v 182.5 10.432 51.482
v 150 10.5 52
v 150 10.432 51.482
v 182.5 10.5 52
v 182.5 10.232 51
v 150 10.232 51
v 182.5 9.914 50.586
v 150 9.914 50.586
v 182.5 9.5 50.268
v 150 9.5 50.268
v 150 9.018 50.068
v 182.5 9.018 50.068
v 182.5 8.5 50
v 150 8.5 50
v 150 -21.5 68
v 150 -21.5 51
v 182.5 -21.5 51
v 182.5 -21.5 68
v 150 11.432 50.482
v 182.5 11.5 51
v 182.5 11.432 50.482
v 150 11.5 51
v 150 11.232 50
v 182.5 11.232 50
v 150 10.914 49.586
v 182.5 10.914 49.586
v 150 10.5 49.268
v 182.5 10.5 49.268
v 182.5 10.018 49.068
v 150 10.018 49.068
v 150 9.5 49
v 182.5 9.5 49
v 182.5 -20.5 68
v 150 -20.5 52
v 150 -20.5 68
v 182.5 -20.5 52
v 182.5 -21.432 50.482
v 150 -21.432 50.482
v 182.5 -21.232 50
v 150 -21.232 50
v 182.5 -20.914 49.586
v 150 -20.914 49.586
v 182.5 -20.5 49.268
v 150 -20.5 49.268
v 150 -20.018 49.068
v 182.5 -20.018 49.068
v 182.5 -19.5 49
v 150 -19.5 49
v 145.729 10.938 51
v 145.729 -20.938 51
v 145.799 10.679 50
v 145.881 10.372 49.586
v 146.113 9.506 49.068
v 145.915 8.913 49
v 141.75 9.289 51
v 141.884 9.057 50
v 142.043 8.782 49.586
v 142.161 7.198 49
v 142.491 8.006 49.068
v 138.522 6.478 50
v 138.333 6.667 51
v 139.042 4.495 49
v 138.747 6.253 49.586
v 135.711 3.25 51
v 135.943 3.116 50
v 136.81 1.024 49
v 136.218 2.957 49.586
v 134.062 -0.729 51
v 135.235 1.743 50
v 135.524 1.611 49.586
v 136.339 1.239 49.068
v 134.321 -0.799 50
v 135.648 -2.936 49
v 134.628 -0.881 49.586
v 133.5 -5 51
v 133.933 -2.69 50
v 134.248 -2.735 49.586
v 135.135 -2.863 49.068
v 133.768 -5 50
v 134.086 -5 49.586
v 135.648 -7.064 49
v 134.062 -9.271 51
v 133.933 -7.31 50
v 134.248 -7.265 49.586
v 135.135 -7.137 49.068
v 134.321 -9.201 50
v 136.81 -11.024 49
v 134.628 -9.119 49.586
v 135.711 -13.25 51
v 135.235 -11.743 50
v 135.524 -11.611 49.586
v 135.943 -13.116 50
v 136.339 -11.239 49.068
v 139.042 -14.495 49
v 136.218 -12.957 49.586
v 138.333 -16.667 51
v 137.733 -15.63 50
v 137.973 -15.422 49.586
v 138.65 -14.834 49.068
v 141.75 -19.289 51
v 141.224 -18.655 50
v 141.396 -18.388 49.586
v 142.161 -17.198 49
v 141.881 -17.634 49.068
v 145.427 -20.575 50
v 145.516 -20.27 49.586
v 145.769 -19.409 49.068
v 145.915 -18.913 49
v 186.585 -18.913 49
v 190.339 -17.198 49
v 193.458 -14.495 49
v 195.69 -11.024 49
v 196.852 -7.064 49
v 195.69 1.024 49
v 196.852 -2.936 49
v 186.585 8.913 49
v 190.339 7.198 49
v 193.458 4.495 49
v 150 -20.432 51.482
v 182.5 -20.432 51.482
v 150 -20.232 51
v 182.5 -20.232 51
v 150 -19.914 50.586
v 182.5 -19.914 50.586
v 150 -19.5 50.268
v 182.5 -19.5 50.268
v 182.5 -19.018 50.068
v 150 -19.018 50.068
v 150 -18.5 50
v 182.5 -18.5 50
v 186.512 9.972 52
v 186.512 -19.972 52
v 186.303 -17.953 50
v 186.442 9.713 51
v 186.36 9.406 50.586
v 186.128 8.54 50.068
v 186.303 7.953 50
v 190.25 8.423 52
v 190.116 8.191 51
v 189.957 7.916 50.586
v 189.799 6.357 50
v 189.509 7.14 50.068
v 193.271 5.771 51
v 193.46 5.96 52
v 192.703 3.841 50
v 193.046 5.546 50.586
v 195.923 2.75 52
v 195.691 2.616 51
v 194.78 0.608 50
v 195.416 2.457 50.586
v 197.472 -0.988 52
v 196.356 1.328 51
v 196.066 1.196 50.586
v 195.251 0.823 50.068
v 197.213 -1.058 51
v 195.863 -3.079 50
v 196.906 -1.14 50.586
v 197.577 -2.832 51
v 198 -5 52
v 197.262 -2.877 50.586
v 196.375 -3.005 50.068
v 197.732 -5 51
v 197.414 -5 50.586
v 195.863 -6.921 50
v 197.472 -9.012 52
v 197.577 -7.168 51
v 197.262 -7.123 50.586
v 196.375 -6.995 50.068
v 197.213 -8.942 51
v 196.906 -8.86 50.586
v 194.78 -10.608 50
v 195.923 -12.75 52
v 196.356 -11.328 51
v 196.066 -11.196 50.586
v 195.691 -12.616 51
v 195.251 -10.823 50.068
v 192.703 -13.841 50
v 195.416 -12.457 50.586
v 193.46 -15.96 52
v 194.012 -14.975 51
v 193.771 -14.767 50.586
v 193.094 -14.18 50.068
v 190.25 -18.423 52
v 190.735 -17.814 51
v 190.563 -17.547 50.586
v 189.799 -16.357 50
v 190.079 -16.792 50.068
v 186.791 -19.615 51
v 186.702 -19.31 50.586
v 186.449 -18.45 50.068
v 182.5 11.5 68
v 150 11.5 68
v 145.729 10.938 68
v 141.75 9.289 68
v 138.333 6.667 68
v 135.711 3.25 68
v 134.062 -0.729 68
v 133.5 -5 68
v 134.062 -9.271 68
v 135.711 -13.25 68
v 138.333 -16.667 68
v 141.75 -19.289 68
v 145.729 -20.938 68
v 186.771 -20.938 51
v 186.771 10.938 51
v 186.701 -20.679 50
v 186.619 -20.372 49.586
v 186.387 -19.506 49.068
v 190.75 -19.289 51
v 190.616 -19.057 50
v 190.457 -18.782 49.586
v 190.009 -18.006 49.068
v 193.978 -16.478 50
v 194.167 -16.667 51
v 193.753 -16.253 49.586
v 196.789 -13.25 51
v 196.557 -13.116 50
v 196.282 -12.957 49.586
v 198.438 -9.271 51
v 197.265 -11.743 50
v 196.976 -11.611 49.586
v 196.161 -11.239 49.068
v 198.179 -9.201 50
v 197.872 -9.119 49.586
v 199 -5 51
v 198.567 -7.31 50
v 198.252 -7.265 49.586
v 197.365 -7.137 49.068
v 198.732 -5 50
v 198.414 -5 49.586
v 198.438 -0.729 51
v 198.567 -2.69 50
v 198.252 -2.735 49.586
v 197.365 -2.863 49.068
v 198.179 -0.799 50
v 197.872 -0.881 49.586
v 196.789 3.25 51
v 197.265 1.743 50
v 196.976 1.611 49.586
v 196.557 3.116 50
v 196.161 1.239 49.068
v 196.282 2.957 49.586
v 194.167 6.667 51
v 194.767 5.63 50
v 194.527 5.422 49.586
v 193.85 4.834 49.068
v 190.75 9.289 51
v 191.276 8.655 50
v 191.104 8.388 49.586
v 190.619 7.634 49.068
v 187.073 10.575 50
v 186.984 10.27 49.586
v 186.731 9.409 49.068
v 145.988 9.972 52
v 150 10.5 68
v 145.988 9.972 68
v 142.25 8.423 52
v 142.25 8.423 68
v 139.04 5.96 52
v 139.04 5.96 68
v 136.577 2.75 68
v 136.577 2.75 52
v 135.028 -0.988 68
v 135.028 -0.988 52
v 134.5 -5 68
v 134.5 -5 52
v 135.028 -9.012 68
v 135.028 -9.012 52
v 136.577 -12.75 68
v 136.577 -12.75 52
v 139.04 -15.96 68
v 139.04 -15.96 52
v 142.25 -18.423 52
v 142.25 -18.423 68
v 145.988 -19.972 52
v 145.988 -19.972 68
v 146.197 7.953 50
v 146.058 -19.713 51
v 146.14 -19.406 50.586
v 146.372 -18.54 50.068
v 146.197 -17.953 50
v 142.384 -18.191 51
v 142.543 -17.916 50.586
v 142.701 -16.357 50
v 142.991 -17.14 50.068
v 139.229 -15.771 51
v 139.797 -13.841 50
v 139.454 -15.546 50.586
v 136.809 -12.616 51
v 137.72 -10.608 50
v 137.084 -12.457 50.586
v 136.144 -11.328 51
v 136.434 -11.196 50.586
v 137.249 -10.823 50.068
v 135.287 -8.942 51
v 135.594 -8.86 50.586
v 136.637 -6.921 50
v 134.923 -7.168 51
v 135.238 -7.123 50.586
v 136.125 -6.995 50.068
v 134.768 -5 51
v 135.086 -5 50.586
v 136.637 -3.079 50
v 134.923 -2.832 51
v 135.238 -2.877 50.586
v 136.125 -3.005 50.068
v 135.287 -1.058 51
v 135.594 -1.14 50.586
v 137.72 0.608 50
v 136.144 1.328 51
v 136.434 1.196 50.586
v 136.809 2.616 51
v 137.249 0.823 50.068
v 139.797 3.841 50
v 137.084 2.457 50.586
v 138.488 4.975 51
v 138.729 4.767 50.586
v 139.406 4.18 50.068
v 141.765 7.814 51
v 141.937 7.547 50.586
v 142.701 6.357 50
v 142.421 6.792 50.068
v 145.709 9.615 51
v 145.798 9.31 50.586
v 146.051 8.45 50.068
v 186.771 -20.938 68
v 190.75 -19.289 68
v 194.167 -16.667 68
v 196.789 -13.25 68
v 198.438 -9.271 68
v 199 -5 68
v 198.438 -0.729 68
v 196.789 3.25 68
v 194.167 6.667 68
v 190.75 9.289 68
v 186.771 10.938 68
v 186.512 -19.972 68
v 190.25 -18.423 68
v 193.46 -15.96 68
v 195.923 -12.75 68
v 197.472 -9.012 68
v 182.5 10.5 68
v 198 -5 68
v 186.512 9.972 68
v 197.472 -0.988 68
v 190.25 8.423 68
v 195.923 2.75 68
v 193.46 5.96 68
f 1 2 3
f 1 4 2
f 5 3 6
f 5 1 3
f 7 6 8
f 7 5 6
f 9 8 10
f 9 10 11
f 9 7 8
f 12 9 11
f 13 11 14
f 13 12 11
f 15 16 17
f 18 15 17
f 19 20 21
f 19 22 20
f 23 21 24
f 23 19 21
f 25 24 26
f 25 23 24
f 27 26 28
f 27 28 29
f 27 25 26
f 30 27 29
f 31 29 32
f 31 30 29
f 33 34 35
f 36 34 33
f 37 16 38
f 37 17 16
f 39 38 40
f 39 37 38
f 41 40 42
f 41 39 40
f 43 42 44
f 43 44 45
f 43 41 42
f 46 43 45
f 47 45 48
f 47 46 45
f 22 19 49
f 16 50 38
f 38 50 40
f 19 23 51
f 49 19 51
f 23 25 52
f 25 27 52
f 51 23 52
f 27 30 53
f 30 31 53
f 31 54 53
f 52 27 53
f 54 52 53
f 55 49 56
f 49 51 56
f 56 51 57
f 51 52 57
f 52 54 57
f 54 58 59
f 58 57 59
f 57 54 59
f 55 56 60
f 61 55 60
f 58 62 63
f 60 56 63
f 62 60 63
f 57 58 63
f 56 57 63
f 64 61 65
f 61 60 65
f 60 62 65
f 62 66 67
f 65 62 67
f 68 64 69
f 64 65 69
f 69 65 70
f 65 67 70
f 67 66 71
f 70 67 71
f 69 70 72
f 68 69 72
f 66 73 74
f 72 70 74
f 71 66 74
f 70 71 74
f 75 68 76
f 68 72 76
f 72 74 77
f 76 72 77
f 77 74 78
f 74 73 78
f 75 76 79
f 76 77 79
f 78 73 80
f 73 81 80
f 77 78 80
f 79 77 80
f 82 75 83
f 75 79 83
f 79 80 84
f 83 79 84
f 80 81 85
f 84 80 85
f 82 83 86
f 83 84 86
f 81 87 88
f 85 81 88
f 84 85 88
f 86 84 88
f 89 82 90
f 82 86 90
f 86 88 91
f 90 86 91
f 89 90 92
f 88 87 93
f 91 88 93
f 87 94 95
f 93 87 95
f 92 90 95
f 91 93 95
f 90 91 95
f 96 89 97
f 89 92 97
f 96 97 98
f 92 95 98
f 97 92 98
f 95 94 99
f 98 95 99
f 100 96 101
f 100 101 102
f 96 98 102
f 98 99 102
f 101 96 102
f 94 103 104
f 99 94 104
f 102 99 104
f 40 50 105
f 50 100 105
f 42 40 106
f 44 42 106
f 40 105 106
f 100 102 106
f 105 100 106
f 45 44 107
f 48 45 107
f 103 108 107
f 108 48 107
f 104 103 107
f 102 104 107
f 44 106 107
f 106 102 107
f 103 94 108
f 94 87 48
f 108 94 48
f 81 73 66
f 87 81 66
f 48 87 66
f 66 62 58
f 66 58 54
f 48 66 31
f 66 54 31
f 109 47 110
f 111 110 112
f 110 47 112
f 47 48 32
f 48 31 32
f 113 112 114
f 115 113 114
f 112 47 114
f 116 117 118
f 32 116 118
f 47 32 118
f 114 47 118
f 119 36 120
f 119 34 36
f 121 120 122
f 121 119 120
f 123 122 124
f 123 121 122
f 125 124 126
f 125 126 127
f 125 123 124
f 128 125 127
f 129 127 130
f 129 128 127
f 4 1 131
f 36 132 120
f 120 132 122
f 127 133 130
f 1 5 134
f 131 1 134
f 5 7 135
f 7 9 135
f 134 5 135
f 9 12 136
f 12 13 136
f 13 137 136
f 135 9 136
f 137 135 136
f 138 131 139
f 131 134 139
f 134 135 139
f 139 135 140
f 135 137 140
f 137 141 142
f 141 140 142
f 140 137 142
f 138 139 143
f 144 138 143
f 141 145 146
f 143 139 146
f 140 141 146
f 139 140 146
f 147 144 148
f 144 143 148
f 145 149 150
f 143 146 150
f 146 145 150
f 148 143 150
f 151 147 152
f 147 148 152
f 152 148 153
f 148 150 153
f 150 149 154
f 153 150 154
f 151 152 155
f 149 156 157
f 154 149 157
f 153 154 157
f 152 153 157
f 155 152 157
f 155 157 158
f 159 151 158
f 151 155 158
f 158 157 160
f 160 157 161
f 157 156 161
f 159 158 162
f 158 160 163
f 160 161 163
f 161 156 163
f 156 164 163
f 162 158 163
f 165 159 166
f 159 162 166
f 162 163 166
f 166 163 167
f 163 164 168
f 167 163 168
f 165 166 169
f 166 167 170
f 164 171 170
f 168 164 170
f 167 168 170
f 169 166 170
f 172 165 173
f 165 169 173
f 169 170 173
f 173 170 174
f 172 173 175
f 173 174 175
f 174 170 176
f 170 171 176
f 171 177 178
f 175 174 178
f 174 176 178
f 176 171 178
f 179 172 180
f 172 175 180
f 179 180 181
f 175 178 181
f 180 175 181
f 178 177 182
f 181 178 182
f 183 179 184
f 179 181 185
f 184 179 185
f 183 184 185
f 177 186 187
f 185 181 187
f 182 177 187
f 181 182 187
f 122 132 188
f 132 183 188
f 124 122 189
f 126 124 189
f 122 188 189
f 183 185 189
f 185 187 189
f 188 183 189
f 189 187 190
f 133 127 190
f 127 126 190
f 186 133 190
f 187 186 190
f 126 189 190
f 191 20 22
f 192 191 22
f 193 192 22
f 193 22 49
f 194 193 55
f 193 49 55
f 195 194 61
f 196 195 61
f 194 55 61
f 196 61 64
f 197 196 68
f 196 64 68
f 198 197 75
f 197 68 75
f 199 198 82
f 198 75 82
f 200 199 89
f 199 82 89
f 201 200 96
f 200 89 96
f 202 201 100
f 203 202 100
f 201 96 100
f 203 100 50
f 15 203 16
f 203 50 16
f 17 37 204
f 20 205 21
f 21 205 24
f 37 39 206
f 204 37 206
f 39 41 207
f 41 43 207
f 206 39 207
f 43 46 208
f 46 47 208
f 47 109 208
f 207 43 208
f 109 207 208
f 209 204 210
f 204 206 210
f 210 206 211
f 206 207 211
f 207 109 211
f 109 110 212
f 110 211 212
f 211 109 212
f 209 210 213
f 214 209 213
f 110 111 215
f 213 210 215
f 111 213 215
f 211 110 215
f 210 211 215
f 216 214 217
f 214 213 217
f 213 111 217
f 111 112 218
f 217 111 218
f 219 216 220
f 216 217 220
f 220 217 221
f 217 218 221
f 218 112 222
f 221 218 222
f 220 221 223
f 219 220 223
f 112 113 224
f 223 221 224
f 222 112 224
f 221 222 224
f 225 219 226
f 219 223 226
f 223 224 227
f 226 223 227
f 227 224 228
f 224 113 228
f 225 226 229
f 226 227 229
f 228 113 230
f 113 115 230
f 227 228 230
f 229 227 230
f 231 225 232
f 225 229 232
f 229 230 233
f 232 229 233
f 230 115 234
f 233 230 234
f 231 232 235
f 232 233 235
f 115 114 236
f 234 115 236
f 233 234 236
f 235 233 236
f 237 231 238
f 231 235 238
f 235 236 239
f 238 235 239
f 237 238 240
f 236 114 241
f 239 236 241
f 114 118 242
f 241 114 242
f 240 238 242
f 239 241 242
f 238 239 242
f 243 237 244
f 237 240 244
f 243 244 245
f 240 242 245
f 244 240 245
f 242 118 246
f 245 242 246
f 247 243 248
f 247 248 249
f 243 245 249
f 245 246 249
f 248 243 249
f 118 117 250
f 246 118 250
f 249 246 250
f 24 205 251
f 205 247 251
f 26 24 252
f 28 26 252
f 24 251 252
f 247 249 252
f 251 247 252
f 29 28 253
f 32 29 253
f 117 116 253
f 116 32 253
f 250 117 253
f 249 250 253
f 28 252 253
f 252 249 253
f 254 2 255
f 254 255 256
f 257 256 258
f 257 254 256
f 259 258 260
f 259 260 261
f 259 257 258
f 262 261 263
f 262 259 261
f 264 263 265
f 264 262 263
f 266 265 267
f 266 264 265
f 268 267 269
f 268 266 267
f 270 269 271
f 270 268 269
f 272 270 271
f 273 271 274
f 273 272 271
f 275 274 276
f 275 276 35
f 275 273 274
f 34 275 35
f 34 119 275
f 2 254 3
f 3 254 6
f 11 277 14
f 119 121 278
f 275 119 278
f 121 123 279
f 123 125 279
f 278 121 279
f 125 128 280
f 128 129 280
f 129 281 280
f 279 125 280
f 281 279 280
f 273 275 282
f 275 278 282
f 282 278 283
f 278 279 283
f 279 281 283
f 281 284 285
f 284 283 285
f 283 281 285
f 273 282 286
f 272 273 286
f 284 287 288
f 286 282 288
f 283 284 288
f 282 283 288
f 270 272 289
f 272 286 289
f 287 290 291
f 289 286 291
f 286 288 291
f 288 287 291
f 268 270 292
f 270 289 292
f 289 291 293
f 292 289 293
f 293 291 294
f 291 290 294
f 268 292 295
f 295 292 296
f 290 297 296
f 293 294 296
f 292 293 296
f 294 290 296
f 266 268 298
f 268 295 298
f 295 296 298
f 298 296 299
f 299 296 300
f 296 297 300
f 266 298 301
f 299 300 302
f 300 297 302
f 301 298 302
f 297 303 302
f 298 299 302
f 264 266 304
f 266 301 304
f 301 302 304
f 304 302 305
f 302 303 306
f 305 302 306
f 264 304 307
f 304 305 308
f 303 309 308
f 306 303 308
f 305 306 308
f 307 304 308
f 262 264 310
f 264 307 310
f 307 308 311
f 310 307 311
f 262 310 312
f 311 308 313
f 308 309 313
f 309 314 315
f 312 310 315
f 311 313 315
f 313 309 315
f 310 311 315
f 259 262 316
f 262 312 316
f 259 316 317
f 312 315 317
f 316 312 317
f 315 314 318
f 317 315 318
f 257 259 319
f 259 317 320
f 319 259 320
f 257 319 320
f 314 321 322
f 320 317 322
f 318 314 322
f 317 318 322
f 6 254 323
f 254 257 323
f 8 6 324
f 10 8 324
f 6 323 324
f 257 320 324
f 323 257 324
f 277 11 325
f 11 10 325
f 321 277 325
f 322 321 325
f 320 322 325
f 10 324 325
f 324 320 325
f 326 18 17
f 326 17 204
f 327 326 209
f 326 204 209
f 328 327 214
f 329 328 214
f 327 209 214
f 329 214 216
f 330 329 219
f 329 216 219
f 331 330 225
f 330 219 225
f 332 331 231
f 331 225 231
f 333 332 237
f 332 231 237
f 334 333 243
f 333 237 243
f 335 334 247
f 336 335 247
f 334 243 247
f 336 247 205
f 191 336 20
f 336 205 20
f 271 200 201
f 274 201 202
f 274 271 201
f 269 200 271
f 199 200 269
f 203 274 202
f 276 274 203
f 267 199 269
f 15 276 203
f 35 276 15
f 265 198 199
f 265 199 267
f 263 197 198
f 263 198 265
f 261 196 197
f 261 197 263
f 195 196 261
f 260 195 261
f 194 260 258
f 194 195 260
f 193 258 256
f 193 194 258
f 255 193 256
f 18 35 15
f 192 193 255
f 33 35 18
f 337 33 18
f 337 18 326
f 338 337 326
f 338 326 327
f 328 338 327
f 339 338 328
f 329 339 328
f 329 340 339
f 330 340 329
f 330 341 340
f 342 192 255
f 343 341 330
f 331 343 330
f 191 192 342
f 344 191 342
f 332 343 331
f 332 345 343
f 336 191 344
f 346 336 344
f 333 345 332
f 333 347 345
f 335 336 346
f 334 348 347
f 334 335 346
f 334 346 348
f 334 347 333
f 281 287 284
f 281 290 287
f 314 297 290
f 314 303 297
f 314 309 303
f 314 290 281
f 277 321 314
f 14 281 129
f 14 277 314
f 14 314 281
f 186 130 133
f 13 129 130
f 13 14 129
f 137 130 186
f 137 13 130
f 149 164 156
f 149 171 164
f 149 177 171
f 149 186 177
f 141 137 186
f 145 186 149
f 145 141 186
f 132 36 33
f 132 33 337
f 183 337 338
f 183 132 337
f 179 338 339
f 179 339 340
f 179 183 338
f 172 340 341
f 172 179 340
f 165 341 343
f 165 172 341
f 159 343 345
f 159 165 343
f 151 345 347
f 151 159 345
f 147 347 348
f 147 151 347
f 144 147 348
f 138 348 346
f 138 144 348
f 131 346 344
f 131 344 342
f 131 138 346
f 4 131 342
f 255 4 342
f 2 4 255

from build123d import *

# Parameters (mm, degrees)
PAD003_DEPTH   = 19
THICKNESS001_T = -1
FILLET004_R    = 2
FILLET005_R    = 2


with BuildPart() as part:
    # Sketch008 → Pad003 (new body)
    with BuildSketch(Plane.XY):
        with BuildLine():
            ThreePointArc((-83, 72.5), (-99.5, 56), (-83, 39.5))
            Line((-83, 39.5), (-50.5, 39.5))
            ThreePointArc((-50.5, 39.5), (-34, 56), (-50.5, 72.5))
            Line((-50.5, 72.5), (-83, 72.5))
        make_face()
    extrude(amount=PAD003_DEPTH)

    # Thickness001
    thickness001_openings = [part.faces().sort_by_distance(p)[0] for p in [
        (-66.75, 56, 19),
    ]]
    offset(amount=THICKNESS001_T, openings=thickness001_openings)

    # Fillet004
    fillet004_edges = [part.edges().sort_by_distance(p)[0] for p in [
        (-98.5, 56, 1),
        (-66.75, 40.5, 1),
        (-35, 56, 1),
        (-66.75, 71.5, 1),
    ]]
    fillet(fillet004_edges, radius=FILLET004_R)

    # Fillet005
    fillet005_edges = [part.edges().sort_by_distance(p)[0] for p in [
        (-99.5, 56, 0),
        (-66.75, 39.5, 0),
        (-34, 56, 0),
        (-66.75, 72.5, 0),
    ]]
    fillet(fillet005_edges, radius=FILLET005_R)


with BuildPart() as part_1:
    # Body003 placement: moved
    add(part.part.moved(Location((233, -61, 49))))


solid = part_1.part
